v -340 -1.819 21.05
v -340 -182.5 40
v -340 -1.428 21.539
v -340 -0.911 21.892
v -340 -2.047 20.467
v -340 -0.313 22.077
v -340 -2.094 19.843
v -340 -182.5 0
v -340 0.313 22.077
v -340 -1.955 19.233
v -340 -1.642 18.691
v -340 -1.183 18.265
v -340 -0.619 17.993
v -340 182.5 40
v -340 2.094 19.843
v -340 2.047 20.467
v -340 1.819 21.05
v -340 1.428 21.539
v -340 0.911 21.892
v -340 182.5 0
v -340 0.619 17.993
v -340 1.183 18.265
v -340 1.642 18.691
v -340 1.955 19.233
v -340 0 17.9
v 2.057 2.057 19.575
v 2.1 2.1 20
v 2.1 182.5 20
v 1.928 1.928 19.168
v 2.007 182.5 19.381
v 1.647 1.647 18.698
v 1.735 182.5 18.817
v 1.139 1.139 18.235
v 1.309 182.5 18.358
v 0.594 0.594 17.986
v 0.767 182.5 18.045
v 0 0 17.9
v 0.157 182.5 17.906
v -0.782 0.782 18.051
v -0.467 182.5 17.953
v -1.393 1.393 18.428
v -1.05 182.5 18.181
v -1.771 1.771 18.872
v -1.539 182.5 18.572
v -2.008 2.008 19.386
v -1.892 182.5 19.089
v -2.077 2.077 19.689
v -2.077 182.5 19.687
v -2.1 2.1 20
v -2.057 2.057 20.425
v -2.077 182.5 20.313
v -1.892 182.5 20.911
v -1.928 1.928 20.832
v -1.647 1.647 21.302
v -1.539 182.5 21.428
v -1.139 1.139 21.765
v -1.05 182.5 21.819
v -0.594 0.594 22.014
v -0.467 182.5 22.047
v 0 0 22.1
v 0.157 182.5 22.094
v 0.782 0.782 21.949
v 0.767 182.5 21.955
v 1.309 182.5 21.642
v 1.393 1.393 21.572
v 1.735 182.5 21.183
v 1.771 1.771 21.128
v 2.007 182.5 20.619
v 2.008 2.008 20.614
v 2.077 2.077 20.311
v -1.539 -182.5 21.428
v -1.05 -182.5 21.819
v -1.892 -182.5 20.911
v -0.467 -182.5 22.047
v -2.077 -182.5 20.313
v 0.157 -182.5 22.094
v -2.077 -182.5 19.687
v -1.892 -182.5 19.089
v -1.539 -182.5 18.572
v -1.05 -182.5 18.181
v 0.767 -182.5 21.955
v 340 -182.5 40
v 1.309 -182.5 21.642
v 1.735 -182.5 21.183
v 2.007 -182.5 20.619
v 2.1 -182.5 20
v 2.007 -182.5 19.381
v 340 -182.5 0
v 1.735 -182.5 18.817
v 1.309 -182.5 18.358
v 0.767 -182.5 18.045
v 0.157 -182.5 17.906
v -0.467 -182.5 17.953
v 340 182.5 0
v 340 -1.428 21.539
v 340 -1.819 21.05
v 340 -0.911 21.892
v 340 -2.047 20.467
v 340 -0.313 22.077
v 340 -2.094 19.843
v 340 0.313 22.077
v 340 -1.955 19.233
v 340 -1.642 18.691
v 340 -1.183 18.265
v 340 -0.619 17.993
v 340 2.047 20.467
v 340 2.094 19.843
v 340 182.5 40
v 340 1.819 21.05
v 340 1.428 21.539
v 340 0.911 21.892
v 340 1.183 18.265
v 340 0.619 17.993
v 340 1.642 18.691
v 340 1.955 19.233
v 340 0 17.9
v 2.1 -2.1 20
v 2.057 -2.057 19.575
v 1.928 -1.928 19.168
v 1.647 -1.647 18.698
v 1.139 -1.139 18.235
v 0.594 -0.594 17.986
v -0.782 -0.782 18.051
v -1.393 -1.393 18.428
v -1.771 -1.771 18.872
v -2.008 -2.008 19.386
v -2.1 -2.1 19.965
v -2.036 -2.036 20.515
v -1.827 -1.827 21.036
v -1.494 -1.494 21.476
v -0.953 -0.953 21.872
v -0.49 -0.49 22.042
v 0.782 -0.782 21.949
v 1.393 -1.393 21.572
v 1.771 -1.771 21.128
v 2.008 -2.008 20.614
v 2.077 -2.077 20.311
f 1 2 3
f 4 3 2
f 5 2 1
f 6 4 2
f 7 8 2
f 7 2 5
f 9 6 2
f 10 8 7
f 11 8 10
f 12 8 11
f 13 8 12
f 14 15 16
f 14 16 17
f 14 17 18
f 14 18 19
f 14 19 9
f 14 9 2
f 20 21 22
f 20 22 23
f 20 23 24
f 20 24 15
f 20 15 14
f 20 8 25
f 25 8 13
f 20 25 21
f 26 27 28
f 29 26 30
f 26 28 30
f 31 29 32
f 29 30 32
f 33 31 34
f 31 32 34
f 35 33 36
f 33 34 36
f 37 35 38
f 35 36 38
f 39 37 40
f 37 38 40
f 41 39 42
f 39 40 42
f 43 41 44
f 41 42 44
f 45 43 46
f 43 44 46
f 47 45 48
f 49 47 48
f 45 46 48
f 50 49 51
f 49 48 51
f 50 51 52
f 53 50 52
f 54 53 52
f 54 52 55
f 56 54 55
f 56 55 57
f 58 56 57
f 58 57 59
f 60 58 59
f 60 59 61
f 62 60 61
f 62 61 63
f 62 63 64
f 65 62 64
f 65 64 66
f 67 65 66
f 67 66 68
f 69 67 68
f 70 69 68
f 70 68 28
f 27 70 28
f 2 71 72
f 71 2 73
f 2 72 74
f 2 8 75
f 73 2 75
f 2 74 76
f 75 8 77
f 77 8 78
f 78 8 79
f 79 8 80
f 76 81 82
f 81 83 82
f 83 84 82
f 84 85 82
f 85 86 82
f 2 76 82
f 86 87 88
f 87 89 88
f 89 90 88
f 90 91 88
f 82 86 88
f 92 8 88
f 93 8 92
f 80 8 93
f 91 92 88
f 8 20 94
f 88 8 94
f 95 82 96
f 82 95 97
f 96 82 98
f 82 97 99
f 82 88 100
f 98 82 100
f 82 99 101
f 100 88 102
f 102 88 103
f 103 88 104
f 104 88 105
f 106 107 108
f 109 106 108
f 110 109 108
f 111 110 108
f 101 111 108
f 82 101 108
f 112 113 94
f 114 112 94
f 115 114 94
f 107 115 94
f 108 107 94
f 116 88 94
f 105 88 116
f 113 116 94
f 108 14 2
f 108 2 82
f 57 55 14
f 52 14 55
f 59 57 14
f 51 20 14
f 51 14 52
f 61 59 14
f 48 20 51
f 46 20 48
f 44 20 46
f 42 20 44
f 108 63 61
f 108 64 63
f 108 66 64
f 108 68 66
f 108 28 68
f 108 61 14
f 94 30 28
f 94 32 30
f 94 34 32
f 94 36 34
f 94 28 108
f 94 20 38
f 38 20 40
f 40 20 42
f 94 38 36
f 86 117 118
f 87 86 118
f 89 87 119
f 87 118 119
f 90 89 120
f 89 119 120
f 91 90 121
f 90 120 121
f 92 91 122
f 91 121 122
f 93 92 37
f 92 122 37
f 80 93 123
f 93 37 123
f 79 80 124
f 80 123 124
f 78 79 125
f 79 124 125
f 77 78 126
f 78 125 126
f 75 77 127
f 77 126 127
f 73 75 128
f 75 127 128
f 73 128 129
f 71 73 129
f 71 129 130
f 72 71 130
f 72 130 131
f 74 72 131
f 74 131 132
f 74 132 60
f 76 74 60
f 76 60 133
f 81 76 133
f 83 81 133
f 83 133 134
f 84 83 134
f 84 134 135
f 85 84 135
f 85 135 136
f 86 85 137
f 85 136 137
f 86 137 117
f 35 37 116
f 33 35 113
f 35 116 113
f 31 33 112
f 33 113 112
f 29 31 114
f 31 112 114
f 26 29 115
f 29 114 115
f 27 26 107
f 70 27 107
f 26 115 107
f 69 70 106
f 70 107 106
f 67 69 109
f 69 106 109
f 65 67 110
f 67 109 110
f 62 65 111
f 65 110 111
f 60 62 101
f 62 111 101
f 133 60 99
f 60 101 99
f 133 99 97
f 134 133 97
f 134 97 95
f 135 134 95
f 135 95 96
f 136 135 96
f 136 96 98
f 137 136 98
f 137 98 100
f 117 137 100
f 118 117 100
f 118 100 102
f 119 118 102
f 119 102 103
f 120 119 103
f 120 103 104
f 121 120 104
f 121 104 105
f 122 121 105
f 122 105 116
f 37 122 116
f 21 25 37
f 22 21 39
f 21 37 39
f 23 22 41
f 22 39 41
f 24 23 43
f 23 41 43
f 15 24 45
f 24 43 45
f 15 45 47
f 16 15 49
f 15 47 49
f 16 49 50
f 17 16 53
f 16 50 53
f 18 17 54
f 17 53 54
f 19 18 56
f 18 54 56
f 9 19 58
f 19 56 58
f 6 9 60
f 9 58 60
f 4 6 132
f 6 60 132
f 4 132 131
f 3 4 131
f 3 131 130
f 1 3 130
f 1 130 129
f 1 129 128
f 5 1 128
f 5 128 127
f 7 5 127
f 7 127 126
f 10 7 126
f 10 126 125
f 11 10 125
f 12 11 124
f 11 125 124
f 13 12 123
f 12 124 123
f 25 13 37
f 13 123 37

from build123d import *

# Parameters (mm, degrees)
SKETCH_1_W         = 680
SKETCH_1_H         = 365
EXTRUDE_1_DEPTH    = 40
HOLE_WIZARD_M5_1_D = 4.2
HOLE_WIZARD_M5_2_D = 4.2


with BuildPart() as part:
    # 草图1 → 凸台-拉伸1 (new body)
    with BuildSketch(Plane.XY):
        Rectangle(SKETCH_1_W, SKETCH_1_H)
    extrude(amount=EXTRUDE_1_DEPTH)

    # M5 螺纹孔1 (through all)
    with Locations(Plane(origin=(0, -182.5, 0), x_dir=(-1, 0, 0), z_dir=(0, -1, 0))):
        with Locations((0, -20)):
            Hole(HOLE_WIZARD_M5_1_D / 2)

    # M5 螺纹孔2 (through all)
    with Locations(Plane.ZY.offset(340)):
        with Locations((20, 0)):
            Hole(HOLE_WIZARD_M5_2_D / 2)


solid = part.part
